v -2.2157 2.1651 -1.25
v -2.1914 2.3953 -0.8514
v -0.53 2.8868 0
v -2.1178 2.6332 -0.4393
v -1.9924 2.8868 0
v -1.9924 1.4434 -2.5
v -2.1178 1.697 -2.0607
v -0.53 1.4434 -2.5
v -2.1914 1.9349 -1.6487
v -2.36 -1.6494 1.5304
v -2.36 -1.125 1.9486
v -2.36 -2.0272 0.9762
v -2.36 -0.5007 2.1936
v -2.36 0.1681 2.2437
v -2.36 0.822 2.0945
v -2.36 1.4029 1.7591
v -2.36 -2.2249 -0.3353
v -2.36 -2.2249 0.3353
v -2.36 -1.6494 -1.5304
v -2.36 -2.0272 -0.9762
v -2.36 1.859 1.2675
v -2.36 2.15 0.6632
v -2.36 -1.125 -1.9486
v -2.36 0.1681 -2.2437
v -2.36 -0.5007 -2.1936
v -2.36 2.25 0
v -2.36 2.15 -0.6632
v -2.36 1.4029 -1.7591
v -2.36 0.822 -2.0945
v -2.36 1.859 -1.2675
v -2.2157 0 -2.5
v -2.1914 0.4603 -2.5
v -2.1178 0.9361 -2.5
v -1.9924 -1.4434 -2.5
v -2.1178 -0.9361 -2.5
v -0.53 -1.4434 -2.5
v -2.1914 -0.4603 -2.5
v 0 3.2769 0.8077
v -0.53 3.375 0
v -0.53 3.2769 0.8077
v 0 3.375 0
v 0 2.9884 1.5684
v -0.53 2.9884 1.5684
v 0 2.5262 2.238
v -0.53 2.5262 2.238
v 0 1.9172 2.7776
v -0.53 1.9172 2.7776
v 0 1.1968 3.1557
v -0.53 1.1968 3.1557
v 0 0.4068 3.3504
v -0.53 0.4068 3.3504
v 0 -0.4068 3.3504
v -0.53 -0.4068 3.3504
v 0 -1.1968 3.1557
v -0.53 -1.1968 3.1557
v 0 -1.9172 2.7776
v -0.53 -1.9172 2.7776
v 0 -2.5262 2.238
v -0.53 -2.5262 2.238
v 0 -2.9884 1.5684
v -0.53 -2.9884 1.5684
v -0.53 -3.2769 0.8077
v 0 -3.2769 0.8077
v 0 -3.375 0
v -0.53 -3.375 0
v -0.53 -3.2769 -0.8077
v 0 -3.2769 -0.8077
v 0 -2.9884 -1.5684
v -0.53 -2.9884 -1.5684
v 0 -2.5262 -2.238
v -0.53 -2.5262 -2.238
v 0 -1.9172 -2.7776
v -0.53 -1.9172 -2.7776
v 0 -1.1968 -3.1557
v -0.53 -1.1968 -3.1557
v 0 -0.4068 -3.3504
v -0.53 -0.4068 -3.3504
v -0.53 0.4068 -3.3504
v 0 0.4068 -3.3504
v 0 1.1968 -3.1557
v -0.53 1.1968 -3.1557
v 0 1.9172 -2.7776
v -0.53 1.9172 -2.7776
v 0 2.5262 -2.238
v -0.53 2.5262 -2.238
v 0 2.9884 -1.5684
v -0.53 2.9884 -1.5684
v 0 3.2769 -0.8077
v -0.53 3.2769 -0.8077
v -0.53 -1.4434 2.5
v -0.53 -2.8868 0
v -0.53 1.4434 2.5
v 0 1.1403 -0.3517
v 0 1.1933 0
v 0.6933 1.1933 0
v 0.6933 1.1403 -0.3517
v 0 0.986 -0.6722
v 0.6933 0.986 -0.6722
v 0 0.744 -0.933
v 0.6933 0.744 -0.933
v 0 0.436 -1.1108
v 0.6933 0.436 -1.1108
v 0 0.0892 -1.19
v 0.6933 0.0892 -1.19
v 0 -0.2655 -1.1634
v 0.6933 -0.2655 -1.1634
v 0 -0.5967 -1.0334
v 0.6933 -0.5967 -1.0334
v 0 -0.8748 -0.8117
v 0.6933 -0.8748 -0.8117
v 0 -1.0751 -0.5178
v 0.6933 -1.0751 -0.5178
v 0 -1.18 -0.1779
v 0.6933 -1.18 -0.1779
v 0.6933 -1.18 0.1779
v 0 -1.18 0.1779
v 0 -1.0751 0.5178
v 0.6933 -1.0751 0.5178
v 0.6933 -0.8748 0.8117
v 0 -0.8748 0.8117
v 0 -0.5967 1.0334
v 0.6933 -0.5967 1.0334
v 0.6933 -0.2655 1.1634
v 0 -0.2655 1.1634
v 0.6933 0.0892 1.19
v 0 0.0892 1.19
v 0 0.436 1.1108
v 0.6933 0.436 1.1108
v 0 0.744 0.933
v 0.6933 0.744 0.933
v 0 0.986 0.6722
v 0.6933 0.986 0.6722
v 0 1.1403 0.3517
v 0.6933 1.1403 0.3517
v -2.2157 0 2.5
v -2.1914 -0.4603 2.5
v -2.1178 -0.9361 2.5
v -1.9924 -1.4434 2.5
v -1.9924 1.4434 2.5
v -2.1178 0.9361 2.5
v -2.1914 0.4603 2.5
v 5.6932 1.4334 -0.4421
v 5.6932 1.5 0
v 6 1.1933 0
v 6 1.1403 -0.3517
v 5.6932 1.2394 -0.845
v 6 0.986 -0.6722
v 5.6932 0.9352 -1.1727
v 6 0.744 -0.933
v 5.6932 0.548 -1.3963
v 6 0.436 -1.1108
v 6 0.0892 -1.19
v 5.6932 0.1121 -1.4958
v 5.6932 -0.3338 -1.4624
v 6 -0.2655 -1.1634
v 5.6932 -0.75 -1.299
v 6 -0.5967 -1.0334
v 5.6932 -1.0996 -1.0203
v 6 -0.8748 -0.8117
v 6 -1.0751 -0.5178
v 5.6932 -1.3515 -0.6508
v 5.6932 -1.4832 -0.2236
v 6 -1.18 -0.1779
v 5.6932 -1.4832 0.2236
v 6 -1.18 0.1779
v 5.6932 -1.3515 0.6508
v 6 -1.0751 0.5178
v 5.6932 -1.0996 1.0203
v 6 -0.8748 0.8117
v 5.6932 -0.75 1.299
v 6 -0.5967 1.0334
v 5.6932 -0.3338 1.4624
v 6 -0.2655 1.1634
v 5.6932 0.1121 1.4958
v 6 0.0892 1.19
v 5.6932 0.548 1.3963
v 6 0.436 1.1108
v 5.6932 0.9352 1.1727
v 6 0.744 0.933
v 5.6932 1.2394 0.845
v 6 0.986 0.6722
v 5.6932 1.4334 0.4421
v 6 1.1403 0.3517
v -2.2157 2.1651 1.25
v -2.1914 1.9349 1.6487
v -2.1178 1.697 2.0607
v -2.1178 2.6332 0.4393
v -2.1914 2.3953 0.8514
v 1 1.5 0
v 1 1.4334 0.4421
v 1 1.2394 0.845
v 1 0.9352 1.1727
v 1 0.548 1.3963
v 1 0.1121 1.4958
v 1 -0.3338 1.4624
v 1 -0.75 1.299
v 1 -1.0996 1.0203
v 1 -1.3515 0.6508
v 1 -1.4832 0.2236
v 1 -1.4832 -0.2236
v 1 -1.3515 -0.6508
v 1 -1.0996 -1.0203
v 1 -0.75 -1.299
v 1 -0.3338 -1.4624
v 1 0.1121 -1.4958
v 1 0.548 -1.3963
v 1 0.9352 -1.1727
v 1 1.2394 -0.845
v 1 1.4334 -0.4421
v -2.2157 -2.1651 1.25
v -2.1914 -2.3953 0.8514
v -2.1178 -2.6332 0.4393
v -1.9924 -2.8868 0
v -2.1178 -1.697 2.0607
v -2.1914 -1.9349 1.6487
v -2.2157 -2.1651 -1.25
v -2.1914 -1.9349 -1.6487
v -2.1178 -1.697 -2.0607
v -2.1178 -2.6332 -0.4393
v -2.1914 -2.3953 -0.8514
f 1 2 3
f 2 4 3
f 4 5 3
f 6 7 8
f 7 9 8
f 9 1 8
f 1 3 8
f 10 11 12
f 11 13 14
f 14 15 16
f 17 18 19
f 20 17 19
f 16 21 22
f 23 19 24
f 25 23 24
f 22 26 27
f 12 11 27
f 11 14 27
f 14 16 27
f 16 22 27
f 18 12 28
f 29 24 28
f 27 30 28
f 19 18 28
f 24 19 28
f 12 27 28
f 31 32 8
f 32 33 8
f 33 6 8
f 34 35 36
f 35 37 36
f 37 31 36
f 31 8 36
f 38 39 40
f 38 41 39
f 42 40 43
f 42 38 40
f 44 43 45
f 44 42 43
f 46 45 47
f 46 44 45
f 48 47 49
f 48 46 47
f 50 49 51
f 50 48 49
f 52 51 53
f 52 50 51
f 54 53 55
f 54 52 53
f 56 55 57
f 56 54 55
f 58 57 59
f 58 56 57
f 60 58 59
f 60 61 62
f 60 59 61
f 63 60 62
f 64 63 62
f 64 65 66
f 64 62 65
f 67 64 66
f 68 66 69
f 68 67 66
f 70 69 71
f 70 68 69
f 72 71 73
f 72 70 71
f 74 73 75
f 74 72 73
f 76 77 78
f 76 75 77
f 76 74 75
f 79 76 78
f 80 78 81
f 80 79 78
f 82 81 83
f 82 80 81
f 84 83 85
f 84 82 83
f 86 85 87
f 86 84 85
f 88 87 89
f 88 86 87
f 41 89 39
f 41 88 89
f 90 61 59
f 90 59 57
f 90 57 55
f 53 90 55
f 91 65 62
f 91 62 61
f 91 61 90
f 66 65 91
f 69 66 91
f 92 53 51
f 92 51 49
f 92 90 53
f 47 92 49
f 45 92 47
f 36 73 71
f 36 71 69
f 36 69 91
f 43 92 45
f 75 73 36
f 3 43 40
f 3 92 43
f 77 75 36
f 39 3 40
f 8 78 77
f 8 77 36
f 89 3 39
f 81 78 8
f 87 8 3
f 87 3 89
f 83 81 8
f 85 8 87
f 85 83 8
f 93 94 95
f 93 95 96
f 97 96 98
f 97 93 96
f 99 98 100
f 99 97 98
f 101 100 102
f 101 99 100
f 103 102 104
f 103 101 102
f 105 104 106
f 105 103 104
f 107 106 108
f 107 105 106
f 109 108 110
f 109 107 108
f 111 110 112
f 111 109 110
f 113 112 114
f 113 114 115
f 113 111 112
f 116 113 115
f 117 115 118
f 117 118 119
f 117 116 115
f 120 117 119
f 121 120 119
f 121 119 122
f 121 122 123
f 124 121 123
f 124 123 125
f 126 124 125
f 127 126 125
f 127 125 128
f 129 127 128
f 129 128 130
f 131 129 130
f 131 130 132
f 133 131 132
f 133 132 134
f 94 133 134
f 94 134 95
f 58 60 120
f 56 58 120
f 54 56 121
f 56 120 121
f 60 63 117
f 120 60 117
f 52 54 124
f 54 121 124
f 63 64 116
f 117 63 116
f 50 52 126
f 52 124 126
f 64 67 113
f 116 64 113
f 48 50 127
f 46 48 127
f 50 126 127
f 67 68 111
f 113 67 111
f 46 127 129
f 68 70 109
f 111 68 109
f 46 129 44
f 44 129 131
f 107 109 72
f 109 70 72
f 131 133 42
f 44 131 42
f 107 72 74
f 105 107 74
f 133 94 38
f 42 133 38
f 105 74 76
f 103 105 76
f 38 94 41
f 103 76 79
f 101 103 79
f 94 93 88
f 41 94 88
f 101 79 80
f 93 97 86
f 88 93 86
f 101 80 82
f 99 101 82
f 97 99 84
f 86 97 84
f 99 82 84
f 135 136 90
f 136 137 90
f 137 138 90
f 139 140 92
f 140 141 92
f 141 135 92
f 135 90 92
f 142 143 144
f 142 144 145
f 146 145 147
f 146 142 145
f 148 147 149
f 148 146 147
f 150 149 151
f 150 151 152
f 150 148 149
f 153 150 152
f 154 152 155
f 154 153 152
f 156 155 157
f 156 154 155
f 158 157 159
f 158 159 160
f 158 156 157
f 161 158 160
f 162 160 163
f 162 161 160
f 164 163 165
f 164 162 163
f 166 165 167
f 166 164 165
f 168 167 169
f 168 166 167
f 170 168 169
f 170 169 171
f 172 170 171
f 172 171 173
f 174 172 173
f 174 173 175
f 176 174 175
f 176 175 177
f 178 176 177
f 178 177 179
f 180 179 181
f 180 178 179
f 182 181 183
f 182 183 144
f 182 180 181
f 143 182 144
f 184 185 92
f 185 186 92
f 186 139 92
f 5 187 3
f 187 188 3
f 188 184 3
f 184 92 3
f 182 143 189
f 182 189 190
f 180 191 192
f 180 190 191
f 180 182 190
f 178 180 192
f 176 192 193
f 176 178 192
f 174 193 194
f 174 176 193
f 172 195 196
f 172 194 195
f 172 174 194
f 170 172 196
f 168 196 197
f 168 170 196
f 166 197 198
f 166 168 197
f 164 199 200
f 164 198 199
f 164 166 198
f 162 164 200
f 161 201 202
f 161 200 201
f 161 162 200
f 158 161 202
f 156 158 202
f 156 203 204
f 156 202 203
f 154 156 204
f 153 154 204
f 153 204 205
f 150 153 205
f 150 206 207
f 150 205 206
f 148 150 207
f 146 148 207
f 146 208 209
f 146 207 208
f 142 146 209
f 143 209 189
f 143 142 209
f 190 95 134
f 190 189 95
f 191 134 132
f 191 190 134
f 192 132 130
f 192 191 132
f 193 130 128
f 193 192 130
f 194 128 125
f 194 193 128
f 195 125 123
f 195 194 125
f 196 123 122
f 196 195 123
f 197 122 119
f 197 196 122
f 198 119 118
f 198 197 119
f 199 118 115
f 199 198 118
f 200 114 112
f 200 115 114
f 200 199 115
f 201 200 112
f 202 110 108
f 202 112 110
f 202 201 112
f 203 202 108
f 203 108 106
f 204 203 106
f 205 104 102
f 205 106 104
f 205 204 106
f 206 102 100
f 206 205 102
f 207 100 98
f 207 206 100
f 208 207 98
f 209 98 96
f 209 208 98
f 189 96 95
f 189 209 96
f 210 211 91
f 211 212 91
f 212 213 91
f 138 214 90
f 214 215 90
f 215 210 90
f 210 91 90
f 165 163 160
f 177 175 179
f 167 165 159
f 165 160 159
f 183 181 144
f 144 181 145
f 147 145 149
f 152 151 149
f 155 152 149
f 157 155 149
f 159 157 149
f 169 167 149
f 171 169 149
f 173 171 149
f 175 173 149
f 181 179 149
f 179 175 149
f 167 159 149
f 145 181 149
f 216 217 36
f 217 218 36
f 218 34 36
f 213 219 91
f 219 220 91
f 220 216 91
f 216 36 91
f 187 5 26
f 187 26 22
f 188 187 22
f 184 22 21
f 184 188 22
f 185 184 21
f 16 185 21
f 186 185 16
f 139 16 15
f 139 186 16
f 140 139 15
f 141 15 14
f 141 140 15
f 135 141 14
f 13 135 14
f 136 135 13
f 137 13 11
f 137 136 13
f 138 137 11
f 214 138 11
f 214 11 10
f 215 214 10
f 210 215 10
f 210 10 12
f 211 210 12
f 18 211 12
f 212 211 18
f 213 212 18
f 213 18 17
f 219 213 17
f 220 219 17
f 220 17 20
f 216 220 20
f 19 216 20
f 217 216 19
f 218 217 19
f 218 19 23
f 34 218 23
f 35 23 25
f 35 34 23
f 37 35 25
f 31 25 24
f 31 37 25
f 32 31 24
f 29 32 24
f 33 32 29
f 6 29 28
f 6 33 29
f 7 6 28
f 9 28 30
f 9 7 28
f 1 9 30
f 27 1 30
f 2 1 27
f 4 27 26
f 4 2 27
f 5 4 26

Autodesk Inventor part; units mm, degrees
ref_plane "YZ Plane" through (0, 0, 0) normal (1, 0, 0) x (0, 1, 0)
ref_plane "XZ Plane" through (0, 0, 0) normal (0, 1, 0) x (-1, 0, 0)
sketch "Sketch1" plane through (0, 0, 0) normal (0, 0, 1) x (1, 0, 0)
  line L0 (0, 3.375) -> (0, 1.1933)
  line L1 (1, 1.5) -> (6, 1.5)
  line L2 (6, 1.5) -> (6, 0)
  line L3 (6, 0) -> (-0.53, 0)
  line L4 (0, -0.675) -> (0, 4.05) projected
  line L5 (-1.836, 0) -> (7.306, 0) projected
  line L6 (-0.53, 0) -> (-0.53, 3.375)
  line L7 (-0.53, 3.375) -> (0, 3.375)
  line L8 (1, 1.5) -> (0.6933, 1.1933)
  line L9 (0.6933, 1.1933) -> (0, 1.1933)
  dimension "d0" = 6
  dimension "d1" = 5
  dimension "d2" = 3
  dimension "d8" = 0.53
  dimension "d9" = 6.75
  dimension "d15" = 2.3866
  dimension "d16" = 0.3067
revolve "Body" add sketch "Sketch1" angle 360 about axis through (6, 0, 0) along (-1, 0, 0)
sketch "Sketch2" plane through (0, 0, 0) normal (1, 0, 0) x (0, 0, -1)
  circle A0 centre (0, 0) radius 3.375 projected
  line L0 (0, 2.8868) -> (2.5, 1.4434)
  line L1 (2.5, 1.4434) -> (2.5, -1.4434)
  line L2 (2.5, -1.4434) -> (0, -2.8868)
  line L3 (0, -2.8868) -> (-2.5, -1.4434)
  line L4 (-2.5, -1.4434) -> (-2.5, 1.4434)
  line L5 (-2.5, 1.4434) -> (0, 2.8868)
  circle A1 centre (0, 0) radius 3.375 projected
  dimension "d10" = 5
extrude "Head" add sketch "Sketch2" against normal blind 2.36 contours L0 L1 L2 L3 L4 L5
sketch "Sketch3" plane through (0, 0, 0) normal (0, 0, 1) x (1, 0, 0)
  line L0 (-2.36, 2.25) -> (-2.36, 2.8868)
  line L1 (-2.36, 2.8868) -> (-1.9924, 2.8868)
  line L2 (-1.9924, 2.8868) -> (-2.36, 2.25)
  line L3 (-1.7645, 2.8868) -> (-2.36, 2.8868)
  line L4 (-2.36, 2.8868) -> (-2.36, 0.5774)
  line L5 (-0.53, 2.8868) -> (-2.36, 2.8868) projected
  line L6 (-2.36, 2.8868) -> (-2.36, 1.4434) projected
  line L7 (-2.726, 0) -> (-0.164, 0) projected
  dimension "d5" = 30
  dimension "d18" = 4.5
revolve "Chamfer1" cut sketch "Sketch3" angle 360 about axis through (-10, 0, 0) along (1, 0, 0)
thread "Thread" size "M3x0.5" class "6g" standard "ISO Metric profile" length 5
chamfer "Chamfer2" distance 0.3067 distance2 0.3068 1 edges at (6, -1.5, 0) measured on face at (6, -0.6587, 0.1791)
ref_plane "Work Plane1" through (3.5, 0, 0) normal (0, 0, 1) x (1, 0, 0)
equation "\"d0\" = NLG"
equation "\"d1\" = GEL"
equation "\"d2\" = GD"
equation "\"d8\" = PHH"
equation "\"d9\" = LADI"
equation "\"d15\" = BDM"
equation "\"d16\" = GAL"
equation "\"d10\" = SW"
equation "\"d3\" = KOH"
equation "\"d13\" = GEL"
equation "\"d6\" = -0.5 * SPD + 0.5 * GD"
equation "\"d5\" = ANG1"
equation "\"d18\" = SW0"
equation "\"NLG\" = 6"
equation "\"GD\" = NND"
equation "\"BDM\" = NND - 1.2269 * PTC"
equation "\"KOH\" = 2.36"
equation "\"GEL\" = 5"
equation "\"LADI\" = 6.75"
equation "\"SW\" = 5"
equation "\"PHH\" = 0.53"
equation "\"SW0\" = 4.5"
equation "\"SPD\" = NND - 1.2269 * PTC"
equation "\"ANG1\" = 30deg"
equation "\"GAL\" = 0.61345 * PTC"
equation "\"GUL\" = 0.61345 * PTC"
equation "\"WFT\" = PHH"
equation "\"PTC\" = 0.5"
equation "\"THREADDIA\" = 3"
equation "\"E0\" = 1.155 * SW"
equation "\"TOA\" = 30deg"
equation "\"NND\" = 3"
equation "\"GD1\" = THREADDIA - 1.2269 * PTC"
equation "\"SDH\" = 3.6"
equation "\"KOH1\" = 1.83"
equation "\"SD2\" = NND"
equation "\"SD\" = 0"
equation "\"RR\" = 0.1"
properties part number "AS 1427 - M3 X 6" material "Steel, High Strength Low Alloy"
